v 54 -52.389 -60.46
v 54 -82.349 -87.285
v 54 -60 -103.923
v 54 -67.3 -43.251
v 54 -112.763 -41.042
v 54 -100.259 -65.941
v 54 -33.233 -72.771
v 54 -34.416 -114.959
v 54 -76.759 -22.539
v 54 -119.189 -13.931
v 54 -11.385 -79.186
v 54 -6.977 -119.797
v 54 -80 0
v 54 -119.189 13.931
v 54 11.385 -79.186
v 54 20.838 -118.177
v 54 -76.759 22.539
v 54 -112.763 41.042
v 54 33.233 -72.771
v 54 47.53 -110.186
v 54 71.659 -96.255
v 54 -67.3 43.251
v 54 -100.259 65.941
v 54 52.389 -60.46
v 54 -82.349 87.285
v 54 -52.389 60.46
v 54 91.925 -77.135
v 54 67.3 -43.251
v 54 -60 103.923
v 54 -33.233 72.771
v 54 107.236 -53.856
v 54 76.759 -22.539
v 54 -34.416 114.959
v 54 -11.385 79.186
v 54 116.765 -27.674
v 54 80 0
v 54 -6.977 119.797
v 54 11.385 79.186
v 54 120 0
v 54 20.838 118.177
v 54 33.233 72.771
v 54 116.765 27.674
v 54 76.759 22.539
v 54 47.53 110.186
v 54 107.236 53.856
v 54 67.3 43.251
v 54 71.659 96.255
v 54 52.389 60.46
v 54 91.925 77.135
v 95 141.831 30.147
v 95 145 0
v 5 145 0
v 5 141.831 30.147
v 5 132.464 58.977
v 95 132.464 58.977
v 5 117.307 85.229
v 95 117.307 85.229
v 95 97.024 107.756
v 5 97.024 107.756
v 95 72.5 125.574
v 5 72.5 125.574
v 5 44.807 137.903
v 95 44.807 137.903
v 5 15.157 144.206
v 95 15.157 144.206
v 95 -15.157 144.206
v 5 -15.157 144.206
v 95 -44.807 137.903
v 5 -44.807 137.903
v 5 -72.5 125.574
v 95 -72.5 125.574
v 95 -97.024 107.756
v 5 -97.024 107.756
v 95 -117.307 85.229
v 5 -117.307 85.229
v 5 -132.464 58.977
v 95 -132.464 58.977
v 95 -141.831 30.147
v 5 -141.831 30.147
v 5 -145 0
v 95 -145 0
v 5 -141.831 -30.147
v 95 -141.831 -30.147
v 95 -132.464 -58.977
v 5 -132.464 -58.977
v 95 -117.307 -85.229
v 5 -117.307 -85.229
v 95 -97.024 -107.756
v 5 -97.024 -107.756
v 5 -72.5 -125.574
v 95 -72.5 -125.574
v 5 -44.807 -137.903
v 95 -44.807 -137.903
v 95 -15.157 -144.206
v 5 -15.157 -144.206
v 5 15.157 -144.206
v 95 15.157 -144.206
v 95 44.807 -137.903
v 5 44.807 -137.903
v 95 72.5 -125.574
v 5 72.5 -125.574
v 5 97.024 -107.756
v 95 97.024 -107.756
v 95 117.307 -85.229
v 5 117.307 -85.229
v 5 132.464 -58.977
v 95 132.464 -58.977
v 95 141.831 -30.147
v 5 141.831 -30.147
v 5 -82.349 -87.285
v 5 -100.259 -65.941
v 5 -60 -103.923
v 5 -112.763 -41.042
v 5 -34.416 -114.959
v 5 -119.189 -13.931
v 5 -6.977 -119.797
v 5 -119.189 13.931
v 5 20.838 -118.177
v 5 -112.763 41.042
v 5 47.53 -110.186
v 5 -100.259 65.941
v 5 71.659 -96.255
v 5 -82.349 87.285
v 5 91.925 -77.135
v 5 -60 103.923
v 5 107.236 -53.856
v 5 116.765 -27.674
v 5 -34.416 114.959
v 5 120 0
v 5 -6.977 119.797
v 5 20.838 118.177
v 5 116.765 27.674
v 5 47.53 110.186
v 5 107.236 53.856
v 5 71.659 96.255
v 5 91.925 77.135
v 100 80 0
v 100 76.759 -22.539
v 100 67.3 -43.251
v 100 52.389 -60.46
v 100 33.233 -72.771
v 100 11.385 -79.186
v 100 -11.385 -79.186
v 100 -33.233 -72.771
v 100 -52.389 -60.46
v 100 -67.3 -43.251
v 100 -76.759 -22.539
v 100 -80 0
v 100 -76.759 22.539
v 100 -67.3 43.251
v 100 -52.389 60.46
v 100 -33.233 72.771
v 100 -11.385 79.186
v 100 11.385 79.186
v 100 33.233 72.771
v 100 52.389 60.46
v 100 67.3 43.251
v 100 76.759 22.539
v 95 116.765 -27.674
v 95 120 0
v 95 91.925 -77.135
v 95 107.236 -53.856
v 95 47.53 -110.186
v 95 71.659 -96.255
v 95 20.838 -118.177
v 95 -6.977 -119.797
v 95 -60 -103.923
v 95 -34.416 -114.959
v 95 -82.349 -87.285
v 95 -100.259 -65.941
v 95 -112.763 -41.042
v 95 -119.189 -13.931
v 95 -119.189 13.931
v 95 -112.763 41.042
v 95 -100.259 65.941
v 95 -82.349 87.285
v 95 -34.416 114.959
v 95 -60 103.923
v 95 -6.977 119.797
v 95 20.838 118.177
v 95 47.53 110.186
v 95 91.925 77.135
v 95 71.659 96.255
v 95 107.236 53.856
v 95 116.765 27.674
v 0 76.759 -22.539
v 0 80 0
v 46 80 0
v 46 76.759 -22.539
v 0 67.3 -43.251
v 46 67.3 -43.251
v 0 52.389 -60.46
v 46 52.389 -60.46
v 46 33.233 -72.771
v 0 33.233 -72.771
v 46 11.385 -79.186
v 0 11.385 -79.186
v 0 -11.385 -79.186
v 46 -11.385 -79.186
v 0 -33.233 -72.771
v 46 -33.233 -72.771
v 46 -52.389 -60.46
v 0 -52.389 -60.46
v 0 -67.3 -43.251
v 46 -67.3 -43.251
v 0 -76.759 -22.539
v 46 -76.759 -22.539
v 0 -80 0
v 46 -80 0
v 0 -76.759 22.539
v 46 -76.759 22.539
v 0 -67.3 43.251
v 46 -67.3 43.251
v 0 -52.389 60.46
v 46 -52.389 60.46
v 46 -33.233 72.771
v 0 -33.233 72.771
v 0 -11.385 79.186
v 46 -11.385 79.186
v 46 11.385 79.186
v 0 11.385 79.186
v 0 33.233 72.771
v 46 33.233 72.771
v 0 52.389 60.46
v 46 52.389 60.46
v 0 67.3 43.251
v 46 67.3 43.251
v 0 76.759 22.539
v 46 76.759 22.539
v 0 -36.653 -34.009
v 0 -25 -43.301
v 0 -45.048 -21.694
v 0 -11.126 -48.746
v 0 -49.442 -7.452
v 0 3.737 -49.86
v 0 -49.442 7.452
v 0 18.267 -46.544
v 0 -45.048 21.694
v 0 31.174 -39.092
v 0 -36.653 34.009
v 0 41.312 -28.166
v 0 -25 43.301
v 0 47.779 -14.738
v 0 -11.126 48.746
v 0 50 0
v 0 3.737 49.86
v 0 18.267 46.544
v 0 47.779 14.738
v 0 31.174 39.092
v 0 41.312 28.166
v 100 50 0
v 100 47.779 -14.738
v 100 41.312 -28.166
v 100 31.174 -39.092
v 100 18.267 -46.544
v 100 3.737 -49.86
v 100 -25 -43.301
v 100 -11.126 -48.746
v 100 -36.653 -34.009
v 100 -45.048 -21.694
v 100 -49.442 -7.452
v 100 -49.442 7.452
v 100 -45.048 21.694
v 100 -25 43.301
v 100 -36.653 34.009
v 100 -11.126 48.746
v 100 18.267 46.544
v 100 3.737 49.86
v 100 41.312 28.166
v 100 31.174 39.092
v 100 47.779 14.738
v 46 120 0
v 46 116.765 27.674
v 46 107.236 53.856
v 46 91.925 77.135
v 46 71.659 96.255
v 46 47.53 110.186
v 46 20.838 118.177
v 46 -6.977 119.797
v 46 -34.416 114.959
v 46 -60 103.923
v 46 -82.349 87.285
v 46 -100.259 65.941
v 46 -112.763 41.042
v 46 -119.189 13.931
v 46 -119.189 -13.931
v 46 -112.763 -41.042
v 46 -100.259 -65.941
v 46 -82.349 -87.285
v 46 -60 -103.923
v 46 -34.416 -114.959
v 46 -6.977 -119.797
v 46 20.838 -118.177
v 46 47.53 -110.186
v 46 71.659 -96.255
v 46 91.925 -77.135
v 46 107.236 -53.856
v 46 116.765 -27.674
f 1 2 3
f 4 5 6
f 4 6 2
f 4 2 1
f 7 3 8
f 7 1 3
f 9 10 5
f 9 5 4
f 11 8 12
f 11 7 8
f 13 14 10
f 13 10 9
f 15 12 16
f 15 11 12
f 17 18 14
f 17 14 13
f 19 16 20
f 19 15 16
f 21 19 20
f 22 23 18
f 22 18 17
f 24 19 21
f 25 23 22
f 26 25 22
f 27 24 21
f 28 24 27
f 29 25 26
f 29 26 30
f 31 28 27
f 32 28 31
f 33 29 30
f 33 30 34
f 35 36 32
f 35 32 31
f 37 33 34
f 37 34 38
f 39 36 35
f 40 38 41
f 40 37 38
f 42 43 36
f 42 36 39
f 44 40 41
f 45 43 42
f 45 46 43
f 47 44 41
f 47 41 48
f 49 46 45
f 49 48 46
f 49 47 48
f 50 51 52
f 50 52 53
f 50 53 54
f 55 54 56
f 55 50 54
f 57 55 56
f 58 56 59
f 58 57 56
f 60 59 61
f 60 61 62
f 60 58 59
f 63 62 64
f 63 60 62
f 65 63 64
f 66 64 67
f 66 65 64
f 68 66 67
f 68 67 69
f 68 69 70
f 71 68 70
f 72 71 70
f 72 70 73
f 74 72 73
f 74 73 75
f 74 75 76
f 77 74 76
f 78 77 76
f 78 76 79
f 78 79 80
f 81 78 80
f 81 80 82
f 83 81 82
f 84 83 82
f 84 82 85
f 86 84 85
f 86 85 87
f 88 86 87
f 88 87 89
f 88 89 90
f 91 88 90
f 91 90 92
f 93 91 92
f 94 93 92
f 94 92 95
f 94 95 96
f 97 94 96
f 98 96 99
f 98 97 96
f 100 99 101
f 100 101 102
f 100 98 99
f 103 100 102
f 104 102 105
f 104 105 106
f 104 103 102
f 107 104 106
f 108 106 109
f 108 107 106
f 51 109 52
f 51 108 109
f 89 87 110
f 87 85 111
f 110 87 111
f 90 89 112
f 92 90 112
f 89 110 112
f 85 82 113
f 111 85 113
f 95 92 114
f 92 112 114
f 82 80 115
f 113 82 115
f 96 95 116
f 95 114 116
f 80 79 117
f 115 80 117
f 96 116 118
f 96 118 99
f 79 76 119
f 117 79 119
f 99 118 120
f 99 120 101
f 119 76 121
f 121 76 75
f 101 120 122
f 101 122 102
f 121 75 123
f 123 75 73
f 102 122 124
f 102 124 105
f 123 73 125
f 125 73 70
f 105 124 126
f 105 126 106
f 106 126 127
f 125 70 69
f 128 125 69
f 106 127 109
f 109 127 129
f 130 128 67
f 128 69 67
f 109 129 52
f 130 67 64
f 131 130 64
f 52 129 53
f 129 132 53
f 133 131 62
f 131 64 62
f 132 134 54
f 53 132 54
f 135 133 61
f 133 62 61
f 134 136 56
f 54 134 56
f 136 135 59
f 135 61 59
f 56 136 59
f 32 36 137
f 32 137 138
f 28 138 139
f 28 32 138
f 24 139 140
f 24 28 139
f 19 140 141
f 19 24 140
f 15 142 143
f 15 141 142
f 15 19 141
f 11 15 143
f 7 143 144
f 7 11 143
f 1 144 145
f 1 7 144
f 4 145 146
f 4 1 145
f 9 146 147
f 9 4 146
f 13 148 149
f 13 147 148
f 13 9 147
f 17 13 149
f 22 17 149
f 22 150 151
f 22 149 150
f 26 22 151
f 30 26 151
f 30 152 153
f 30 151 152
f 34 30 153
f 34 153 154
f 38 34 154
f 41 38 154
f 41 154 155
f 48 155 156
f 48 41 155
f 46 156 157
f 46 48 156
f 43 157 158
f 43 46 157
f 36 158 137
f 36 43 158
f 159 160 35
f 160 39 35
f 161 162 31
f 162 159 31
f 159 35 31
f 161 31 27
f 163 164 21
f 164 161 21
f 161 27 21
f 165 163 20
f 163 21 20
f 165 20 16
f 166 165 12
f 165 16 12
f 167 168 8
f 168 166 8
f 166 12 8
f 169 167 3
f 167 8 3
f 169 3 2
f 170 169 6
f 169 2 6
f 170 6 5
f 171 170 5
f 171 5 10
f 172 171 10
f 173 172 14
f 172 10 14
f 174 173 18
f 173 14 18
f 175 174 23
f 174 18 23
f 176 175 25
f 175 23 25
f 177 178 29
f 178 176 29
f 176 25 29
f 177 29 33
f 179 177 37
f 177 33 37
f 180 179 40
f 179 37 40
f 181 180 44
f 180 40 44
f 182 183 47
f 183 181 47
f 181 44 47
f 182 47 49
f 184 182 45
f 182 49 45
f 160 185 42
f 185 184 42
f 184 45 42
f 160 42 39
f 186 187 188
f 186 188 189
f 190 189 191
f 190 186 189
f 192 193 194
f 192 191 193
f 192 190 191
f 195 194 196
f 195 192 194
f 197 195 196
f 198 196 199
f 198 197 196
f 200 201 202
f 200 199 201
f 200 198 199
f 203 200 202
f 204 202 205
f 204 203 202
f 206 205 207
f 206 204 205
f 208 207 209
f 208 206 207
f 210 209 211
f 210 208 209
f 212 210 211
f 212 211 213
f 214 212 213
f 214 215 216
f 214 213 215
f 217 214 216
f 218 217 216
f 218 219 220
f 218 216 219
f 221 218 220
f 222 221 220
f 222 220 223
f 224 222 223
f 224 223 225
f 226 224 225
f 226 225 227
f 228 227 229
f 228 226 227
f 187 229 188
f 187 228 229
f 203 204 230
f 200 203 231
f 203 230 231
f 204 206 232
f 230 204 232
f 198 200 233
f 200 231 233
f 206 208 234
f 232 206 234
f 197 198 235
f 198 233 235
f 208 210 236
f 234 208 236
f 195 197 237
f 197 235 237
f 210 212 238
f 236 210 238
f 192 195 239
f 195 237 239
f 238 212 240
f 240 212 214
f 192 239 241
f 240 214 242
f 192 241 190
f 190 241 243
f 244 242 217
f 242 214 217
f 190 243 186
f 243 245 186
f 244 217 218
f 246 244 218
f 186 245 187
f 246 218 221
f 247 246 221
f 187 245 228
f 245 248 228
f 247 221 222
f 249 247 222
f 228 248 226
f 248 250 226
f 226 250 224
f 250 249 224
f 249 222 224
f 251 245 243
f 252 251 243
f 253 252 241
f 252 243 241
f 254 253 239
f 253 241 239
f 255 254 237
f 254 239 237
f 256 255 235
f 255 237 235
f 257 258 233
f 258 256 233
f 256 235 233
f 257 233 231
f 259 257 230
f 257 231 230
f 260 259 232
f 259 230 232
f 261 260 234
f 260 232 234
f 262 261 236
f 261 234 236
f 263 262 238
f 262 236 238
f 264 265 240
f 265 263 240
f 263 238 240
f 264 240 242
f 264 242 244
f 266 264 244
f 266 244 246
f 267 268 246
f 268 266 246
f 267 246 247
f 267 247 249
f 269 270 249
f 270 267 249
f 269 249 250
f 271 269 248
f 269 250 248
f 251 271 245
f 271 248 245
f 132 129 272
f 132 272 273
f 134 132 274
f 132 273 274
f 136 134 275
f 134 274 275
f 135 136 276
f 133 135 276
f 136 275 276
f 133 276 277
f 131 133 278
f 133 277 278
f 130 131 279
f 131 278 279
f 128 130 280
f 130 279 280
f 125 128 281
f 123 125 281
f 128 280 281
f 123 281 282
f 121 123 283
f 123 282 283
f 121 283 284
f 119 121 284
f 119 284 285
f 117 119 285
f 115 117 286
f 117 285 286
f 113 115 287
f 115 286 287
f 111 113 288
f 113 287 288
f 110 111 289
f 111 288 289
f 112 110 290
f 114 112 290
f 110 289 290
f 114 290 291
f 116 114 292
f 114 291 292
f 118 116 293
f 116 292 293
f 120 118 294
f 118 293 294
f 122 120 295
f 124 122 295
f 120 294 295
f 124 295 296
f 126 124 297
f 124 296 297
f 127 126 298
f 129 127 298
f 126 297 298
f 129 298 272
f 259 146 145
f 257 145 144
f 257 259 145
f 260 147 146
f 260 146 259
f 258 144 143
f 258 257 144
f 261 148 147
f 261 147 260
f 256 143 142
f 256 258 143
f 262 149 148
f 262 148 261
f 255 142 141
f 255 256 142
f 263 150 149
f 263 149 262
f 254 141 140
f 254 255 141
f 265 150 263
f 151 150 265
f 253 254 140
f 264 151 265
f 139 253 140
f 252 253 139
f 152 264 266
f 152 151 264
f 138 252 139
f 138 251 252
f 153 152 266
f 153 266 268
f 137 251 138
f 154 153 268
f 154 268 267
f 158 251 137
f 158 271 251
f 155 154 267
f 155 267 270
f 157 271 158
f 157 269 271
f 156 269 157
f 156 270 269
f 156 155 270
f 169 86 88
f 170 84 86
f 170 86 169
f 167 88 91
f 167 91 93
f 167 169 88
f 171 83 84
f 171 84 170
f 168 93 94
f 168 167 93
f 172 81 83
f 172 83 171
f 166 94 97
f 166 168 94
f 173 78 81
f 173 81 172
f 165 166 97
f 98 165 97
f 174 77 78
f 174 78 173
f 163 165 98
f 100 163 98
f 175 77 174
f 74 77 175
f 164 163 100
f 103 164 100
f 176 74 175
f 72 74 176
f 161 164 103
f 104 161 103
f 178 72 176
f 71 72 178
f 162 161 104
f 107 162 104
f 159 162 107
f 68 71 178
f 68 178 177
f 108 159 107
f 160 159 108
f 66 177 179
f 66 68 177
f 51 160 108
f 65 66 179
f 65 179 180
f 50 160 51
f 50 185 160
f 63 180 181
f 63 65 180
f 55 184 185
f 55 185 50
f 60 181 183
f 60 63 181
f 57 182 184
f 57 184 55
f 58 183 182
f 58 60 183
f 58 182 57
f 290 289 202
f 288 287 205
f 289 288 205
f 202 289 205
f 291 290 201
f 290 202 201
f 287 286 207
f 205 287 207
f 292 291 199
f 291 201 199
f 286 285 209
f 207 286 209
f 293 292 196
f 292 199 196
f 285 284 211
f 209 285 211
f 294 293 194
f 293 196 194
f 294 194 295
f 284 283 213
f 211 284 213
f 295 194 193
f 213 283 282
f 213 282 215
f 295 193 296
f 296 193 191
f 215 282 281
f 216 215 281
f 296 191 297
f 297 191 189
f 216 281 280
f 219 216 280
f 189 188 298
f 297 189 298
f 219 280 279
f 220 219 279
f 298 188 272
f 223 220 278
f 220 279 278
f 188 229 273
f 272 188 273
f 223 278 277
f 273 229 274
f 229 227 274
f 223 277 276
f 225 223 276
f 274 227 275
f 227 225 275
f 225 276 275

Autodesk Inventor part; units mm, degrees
ref_plane "XZ Plane" through (0, 0, 0) normal (0, 1, 0) x (-1, 0, 0)
sketch "Sketch1" plane through (0, 0, 0) normal (1, 0, 0) x (0, 1, 0)
  circle A0 centre (0, 0) radius 50
  circle A1 centre (0, 0) radius 80
  dimension "d0" = 100
  dimension "d1" = 160
extrude "Extrusion1" add sketch "Sketch1" along normal blind 100
ref_plane "Work Plane1" through (0, 0, 0) normal (0, 0, 1) x (1, 0, 0)
sketch "Sketch2" plane through (0, 0, 0) normal (0, 0, 1) x (1, 0, 0)
  line L0 (0, 80) -> (100, 80) projected
  line L1 (54, 80) -> (54, 120)
  line L2 (54, 120) -> (46, 120)
  line L3 (46, 120) -> (46, 80)
  line L4 (0, -80) -> (0, 80) projected
  line L5 (-20, 0) -> (120, 0) projected
  point P0 (0, 0)
  dimension "d5" = 8
  dimension "d6" = 46
  dimension "d7" = 40
revolve "Revolution1" add sketch "Sketch2" angle 360 about axis through (-10, 0, 0) along (1, 0, 0)
ref_plane "Work Plane2" through (50, 0, 0) normal (1, 0, 0) x (0, 1, 0)
sketch "Sketch4" plane through (50, 0, 0) normal (1, 0, 0) x (0, 1, 0)
  circle A0 centre (0, 0) radius 145
  circle A1 centre (0, 0) radius 120
  dimension "d12" = 290
  dimension "d13" = 240
extrude "Extrusion2" add sketch "Sketch4" along normal mid plane 90
sketch "Sketch5" plane through (95, 0, 0) normal (1, 0, 0) x (0, 0, -1)
  point P0 (0, 0)
properties part number "DiscoPaleSatdio1-3"
